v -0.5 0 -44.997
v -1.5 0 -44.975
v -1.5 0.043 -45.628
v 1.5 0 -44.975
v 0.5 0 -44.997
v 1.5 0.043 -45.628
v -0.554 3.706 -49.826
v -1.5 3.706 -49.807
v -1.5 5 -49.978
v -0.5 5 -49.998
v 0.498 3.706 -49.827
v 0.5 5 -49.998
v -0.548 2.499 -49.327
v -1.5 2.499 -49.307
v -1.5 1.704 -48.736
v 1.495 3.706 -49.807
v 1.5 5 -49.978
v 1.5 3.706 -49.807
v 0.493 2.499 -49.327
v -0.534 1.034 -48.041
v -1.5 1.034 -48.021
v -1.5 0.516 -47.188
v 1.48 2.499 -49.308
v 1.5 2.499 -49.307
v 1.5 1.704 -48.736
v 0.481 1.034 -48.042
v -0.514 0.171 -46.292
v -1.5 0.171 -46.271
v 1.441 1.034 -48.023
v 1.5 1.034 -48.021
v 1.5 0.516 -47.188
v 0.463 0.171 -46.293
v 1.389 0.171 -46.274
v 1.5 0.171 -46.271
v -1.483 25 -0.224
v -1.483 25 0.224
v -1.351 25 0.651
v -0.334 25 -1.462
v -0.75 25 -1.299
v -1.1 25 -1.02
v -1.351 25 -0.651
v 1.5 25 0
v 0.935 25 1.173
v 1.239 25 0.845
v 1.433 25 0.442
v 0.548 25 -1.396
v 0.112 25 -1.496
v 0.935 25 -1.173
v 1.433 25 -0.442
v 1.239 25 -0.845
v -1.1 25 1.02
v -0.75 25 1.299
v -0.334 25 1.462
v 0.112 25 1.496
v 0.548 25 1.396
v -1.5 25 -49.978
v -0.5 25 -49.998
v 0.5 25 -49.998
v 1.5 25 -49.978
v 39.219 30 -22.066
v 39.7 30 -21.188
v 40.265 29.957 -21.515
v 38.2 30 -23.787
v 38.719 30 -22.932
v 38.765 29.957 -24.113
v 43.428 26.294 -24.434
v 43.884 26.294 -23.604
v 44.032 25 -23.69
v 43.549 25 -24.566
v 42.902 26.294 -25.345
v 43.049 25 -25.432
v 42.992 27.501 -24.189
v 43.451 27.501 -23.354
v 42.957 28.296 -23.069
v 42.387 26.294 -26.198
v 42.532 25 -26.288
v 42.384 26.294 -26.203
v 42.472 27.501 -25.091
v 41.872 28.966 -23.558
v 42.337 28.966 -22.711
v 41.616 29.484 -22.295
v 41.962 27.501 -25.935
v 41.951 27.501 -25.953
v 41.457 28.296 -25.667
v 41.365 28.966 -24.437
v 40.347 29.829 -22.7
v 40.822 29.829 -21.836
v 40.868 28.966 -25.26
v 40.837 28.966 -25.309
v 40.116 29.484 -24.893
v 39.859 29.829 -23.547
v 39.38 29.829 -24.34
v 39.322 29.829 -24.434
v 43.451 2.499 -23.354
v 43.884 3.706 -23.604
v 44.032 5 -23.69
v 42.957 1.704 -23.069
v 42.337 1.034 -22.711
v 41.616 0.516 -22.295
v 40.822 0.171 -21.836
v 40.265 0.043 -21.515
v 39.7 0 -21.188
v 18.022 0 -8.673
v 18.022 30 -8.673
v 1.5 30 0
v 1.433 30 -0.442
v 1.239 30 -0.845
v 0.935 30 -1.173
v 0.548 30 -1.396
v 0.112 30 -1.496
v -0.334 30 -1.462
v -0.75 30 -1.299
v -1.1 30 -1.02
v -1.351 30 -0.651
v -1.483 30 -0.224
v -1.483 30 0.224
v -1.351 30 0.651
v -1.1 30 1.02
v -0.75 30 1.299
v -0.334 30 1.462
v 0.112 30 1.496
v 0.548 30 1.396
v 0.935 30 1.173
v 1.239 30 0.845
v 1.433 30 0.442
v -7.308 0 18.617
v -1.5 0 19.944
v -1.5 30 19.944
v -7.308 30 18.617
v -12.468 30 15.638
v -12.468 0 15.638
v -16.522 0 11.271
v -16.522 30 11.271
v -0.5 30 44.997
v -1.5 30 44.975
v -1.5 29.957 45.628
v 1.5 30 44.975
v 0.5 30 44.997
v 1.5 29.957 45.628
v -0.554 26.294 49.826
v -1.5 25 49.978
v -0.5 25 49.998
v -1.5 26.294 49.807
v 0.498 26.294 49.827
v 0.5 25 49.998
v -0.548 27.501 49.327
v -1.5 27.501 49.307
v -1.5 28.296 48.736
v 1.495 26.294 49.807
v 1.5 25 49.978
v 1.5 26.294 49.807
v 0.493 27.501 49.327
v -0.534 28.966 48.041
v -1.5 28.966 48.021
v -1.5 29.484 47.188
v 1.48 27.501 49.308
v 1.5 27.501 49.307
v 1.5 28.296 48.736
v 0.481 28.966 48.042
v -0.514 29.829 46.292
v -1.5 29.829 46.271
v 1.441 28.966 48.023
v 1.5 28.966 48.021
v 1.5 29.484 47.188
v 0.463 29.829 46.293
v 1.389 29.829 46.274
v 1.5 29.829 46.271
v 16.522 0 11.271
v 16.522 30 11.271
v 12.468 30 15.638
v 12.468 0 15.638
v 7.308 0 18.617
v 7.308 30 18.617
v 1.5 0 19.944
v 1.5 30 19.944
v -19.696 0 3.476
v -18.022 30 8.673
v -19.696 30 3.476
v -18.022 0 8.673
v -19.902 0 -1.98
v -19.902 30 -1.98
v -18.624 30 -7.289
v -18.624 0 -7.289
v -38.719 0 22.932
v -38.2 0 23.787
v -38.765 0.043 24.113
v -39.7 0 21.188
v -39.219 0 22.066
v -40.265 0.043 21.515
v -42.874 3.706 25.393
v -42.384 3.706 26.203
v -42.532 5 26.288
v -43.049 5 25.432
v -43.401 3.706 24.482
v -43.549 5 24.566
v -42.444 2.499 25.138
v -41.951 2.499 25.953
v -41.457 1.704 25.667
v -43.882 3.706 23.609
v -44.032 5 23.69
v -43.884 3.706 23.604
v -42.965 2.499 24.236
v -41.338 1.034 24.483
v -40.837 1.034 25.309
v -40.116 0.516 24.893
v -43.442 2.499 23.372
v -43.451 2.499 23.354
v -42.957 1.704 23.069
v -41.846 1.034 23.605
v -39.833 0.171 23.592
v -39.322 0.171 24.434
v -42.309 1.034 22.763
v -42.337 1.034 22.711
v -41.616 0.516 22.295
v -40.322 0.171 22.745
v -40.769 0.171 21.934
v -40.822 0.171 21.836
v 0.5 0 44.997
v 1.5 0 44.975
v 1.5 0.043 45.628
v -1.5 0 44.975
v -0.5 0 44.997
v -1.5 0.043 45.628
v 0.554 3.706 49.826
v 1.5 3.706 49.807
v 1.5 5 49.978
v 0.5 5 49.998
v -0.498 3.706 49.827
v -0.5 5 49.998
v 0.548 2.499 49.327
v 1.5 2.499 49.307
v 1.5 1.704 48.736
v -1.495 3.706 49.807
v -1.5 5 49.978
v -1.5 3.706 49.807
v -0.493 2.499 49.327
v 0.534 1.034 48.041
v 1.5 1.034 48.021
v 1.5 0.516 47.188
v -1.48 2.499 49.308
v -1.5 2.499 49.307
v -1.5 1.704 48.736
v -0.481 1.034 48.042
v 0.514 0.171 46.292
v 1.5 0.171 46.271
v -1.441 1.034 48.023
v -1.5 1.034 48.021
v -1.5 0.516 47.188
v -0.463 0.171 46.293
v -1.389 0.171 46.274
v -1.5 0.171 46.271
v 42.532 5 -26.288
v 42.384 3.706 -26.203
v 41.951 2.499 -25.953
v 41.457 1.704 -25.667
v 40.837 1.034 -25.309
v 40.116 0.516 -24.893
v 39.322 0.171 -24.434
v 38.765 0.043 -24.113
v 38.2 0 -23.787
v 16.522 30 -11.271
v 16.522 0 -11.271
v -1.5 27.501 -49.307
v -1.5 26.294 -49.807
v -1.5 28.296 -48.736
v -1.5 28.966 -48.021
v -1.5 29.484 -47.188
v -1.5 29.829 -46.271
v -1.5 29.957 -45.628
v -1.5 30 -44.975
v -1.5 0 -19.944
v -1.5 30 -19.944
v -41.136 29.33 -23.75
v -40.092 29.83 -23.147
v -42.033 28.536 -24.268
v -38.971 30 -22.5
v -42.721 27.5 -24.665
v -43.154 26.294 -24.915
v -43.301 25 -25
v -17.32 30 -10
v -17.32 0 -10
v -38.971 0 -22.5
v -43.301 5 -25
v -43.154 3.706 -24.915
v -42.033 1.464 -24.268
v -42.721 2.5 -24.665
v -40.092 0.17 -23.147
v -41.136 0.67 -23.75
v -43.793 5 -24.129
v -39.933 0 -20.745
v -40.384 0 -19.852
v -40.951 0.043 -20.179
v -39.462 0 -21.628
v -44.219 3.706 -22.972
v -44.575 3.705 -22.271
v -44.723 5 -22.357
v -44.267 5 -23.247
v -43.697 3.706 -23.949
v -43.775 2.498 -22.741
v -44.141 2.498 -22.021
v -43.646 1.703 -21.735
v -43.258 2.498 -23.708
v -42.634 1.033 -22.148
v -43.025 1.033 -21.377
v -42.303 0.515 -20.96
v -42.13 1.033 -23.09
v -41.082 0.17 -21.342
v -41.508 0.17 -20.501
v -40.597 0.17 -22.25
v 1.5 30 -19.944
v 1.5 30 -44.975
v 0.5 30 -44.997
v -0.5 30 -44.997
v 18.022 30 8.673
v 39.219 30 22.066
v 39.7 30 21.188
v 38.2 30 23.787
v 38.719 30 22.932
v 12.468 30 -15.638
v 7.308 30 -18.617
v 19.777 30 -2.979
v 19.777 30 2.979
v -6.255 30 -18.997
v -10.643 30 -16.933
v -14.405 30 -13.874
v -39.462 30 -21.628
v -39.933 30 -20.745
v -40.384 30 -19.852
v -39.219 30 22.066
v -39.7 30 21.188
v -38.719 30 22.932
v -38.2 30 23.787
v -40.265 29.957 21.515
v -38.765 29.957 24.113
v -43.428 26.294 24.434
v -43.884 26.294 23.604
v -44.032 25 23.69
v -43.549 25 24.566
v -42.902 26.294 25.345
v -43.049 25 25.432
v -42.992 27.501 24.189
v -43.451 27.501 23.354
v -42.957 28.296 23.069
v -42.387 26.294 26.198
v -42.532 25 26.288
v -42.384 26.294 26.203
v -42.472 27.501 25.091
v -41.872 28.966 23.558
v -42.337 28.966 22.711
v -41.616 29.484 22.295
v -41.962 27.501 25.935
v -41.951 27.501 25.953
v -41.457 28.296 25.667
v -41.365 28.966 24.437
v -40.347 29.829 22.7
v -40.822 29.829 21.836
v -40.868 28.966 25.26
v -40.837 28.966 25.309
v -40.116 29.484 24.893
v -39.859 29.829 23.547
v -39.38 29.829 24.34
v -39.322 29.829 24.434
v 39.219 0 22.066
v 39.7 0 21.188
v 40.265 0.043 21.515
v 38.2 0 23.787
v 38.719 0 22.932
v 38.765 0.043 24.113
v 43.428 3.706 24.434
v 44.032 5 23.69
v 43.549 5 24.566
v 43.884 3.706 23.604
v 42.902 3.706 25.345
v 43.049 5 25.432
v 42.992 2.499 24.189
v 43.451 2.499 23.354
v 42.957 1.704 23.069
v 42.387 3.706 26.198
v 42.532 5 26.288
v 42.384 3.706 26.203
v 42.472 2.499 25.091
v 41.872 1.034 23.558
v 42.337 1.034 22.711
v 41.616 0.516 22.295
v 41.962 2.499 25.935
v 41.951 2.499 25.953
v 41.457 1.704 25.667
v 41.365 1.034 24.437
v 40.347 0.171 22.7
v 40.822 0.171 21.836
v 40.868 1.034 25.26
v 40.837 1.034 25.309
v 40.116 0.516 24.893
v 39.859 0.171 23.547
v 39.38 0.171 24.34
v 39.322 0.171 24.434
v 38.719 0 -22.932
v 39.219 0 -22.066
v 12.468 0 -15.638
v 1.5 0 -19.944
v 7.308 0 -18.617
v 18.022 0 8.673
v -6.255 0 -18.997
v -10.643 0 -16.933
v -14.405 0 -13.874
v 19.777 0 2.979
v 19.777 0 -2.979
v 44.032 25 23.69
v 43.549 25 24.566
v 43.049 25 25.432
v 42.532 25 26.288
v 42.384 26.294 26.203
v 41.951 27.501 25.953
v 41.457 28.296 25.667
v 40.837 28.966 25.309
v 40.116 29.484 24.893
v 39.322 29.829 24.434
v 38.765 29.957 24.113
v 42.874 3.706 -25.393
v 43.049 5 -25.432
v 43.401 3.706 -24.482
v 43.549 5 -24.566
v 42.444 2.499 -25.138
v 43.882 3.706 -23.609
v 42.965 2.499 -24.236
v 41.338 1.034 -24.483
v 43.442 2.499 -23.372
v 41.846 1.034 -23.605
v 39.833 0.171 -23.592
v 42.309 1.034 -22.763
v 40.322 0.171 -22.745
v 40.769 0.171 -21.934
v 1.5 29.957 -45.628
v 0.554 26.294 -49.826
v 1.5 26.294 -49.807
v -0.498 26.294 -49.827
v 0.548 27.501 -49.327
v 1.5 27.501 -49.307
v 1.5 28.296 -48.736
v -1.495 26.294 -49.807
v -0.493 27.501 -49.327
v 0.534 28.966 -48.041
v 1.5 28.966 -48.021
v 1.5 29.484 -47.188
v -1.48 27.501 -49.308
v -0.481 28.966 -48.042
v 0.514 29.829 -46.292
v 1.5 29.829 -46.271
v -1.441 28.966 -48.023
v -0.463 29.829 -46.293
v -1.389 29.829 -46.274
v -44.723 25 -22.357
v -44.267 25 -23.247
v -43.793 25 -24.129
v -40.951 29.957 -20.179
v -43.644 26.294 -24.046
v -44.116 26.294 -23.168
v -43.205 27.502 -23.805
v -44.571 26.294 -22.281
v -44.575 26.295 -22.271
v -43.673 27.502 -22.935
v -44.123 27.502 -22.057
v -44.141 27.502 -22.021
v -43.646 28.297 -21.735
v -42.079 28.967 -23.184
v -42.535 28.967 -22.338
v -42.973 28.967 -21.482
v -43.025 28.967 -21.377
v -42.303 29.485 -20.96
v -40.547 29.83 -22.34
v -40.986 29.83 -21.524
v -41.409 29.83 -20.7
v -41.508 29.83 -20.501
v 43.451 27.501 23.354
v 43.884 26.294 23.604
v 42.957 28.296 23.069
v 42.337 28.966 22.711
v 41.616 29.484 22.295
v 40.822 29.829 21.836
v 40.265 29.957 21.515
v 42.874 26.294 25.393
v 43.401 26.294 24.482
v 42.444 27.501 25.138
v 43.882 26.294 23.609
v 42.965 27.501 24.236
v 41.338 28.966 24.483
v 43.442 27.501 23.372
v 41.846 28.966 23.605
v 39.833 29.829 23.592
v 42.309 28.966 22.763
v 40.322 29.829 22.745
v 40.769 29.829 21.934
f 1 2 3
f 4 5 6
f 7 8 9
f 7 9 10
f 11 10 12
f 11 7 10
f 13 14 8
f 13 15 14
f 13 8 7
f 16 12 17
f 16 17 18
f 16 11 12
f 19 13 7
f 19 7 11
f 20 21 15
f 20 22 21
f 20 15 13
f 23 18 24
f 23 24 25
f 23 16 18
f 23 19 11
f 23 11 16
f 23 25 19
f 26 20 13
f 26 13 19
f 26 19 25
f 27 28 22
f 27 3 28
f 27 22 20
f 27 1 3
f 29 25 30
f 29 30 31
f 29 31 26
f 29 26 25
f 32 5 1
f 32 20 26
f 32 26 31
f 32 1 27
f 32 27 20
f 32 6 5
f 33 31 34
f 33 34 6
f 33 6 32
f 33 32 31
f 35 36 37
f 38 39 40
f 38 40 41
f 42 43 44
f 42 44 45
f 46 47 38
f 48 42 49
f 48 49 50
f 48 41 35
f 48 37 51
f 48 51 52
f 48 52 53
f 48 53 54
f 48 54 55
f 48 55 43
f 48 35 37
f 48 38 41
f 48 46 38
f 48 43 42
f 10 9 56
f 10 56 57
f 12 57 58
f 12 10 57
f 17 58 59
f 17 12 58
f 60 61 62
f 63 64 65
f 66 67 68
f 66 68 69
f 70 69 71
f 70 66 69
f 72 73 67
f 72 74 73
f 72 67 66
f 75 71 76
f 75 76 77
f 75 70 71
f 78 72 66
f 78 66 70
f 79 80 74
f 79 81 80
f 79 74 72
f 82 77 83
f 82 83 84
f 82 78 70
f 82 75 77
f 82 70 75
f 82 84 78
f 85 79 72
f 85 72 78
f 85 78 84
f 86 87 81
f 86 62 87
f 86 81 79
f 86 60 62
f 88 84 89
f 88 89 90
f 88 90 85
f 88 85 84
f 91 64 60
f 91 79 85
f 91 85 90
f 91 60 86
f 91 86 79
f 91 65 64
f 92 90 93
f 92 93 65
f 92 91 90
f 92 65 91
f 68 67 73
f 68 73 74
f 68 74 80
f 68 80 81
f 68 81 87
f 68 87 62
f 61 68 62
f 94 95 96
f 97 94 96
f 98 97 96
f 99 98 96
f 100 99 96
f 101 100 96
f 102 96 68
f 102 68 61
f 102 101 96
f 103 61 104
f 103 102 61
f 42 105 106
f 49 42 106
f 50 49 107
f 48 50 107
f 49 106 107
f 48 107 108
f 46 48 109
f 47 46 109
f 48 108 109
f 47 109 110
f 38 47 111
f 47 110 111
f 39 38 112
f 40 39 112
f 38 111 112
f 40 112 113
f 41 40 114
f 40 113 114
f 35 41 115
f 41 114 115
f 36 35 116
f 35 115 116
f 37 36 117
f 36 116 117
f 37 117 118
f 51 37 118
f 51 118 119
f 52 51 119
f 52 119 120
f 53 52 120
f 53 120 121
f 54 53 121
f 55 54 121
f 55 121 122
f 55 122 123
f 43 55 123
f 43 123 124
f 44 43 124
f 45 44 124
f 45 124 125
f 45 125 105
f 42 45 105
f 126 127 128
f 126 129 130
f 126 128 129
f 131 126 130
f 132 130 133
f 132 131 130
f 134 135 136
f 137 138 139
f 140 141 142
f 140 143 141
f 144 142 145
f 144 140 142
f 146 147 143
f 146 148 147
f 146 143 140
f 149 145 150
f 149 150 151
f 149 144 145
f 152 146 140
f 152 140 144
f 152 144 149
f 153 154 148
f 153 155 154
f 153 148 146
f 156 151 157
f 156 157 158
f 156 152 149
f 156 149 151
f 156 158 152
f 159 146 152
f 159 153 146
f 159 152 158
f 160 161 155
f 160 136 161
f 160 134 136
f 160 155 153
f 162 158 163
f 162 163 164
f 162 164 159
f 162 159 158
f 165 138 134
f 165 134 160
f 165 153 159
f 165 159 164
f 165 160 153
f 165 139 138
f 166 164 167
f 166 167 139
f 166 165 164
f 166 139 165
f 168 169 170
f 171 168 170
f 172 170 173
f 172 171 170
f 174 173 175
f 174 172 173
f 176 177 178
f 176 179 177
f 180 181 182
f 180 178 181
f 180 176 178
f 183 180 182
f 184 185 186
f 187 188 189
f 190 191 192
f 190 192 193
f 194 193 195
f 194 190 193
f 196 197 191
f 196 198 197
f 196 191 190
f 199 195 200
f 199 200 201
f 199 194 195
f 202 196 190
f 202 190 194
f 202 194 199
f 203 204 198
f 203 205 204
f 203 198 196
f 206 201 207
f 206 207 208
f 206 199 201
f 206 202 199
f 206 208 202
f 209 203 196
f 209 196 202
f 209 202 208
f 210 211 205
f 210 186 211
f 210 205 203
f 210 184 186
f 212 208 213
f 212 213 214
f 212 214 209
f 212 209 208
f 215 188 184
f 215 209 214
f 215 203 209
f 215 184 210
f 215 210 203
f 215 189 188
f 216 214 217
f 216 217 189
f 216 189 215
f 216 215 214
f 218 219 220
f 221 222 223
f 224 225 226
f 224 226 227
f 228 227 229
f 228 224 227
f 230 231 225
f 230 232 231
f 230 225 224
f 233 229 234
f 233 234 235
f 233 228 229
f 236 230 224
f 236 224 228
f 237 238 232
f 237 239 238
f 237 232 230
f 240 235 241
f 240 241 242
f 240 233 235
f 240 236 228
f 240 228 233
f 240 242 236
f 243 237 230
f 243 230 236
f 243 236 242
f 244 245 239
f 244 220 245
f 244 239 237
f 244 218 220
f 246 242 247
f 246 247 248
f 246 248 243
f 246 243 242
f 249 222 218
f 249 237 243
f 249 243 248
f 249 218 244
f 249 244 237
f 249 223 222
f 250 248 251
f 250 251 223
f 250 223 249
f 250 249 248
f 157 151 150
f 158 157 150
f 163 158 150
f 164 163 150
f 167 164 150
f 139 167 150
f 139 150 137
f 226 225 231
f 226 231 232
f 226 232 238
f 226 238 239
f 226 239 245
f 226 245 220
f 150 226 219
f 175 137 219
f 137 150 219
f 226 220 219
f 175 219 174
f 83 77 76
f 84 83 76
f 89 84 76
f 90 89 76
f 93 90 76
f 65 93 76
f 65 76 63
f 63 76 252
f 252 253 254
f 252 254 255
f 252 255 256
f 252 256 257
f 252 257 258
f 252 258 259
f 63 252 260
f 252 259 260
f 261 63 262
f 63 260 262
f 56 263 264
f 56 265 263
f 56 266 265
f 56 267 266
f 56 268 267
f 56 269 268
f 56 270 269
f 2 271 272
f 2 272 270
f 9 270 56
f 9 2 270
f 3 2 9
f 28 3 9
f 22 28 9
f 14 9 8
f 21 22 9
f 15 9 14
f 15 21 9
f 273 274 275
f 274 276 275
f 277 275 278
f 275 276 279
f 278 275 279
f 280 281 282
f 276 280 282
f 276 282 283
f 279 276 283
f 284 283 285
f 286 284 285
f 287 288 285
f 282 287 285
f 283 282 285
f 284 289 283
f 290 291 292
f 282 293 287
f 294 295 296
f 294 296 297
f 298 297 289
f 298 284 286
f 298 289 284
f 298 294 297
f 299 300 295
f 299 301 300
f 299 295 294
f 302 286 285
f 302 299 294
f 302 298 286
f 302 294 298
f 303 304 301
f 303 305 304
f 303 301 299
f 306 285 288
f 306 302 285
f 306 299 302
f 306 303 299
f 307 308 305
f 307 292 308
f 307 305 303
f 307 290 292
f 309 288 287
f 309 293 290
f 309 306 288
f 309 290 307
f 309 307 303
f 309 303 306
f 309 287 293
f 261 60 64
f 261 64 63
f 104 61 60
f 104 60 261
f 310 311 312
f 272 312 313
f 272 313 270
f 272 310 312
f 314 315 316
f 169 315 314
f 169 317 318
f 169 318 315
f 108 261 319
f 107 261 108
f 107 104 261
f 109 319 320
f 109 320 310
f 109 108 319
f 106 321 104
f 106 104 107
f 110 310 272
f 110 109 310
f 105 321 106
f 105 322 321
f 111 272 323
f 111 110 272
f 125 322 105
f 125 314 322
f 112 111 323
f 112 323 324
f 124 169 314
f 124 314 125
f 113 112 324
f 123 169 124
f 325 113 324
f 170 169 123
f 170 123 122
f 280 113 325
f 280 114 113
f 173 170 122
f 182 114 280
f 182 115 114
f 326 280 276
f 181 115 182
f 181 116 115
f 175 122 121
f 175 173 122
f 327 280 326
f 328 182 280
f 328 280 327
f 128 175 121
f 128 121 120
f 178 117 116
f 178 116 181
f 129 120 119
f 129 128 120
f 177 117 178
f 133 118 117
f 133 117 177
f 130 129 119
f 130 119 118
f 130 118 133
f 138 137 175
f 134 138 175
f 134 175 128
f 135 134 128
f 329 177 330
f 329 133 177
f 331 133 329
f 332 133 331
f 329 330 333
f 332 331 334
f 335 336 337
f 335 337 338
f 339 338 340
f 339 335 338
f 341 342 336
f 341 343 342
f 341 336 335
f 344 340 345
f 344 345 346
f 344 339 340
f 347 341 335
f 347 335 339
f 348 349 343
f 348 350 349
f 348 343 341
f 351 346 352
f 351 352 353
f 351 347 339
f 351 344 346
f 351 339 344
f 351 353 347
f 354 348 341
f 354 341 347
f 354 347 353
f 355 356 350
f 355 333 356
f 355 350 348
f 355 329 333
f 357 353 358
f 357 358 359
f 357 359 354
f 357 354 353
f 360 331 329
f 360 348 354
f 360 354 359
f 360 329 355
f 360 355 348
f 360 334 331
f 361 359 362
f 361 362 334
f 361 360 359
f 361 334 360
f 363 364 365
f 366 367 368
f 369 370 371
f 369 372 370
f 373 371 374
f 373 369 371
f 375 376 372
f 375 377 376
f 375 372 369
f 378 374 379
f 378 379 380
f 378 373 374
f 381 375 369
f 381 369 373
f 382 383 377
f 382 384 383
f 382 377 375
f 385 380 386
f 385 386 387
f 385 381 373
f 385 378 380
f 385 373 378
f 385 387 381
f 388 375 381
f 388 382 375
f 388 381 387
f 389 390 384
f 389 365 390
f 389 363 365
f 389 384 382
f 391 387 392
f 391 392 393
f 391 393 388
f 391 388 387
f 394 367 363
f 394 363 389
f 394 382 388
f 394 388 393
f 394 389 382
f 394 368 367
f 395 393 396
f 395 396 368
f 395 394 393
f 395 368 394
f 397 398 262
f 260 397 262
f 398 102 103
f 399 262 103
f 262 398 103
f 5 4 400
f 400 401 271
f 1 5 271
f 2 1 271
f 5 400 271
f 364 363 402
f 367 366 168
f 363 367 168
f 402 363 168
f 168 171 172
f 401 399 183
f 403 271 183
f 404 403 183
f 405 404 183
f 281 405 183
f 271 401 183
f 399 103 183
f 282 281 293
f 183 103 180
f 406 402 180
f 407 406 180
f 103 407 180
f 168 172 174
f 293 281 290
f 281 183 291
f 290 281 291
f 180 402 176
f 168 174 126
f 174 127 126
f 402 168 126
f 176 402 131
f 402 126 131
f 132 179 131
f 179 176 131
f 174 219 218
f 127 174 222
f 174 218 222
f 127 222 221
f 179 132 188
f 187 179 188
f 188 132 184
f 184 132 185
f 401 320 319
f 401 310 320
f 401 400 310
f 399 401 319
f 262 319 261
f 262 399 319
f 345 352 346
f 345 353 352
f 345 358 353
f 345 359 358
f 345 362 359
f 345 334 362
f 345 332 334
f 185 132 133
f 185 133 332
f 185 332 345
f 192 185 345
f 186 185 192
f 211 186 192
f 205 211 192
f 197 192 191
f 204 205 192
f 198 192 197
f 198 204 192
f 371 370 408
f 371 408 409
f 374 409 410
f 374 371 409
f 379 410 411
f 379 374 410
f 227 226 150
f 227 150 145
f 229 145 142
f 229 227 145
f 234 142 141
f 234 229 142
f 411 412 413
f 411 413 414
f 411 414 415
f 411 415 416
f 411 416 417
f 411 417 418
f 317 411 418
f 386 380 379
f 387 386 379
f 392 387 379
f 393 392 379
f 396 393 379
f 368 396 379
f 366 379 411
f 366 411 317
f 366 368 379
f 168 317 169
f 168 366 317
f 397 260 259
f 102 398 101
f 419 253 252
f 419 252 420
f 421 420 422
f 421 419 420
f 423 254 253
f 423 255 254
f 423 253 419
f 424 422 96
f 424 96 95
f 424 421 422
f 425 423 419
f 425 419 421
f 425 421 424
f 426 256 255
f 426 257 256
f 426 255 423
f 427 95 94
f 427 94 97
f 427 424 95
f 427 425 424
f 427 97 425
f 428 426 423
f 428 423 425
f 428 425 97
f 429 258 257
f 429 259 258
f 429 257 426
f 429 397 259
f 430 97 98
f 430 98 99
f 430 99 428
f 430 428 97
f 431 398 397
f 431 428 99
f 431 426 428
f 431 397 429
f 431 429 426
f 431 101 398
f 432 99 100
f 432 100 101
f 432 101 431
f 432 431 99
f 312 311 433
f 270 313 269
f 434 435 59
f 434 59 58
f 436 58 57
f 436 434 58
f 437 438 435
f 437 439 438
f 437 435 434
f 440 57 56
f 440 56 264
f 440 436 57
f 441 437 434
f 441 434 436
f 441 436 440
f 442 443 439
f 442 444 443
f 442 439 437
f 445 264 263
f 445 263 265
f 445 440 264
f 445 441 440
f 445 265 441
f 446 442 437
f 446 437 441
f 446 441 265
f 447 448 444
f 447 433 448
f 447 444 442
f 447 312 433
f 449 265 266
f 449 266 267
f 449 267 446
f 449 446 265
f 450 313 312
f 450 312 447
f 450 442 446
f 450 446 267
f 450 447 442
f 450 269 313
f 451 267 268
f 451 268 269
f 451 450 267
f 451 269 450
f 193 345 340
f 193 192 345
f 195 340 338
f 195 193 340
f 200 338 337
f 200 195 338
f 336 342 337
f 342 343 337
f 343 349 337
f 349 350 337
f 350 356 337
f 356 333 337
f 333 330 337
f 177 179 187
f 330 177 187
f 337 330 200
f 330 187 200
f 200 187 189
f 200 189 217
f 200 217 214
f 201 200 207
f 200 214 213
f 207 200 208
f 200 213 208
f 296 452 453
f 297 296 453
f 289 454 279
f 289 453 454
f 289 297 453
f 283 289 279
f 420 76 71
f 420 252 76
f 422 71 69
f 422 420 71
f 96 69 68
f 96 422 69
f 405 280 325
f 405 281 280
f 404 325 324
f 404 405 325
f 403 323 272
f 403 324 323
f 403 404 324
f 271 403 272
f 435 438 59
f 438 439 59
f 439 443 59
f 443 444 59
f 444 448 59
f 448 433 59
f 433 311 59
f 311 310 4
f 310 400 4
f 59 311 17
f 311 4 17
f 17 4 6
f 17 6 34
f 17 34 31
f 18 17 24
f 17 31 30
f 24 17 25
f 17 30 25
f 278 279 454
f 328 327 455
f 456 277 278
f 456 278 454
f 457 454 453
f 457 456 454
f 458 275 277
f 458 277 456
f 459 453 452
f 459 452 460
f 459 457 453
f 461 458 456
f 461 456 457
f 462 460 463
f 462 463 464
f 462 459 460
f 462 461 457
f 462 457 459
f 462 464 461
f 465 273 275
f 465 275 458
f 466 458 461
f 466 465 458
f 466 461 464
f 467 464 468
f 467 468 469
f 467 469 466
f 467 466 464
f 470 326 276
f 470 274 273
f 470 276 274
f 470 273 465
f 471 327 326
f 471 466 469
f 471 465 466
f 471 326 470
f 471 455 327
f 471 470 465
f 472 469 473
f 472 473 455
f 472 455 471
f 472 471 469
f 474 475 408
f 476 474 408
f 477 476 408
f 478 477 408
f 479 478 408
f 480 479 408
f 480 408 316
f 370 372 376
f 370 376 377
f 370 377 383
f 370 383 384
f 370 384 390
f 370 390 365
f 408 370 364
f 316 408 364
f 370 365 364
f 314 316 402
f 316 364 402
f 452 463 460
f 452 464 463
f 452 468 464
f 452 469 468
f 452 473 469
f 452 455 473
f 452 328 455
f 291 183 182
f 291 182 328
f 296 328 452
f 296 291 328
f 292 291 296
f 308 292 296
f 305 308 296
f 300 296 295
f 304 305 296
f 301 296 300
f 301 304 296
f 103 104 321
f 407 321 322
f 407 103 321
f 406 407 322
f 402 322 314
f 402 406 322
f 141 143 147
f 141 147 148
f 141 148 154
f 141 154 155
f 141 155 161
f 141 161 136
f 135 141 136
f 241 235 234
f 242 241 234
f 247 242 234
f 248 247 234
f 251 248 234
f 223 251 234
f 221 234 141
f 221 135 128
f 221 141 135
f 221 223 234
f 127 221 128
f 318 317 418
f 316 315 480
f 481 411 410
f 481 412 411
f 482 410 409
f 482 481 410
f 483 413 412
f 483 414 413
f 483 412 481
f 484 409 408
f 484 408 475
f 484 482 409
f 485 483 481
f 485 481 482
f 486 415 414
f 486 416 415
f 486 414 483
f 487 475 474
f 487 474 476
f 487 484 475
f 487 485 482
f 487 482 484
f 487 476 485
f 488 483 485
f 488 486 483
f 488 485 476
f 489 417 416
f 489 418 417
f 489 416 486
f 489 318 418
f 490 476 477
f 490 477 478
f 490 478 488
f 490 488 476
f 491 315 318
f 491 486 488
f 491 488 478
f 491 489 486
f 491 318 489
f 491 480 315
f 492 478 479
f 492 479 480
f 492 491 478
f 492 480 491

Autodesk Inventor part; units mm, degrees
ref_plane "YZ Plane" through (0, 0, 0) normal (1, 0, 0) x (0, 1, 0)
ref_plane "XZ Plane" through (0, 0, 0) normal (0, 1, 0) x (-1, 0, 0)
ref_plane "XY Plane" through (0, 0, 0) normal (0, 0, 1) x (1, 0, 0)
sketch "Sketch1" plane through (0, 0, 0) normal (0, 1, 0) x (-1, 0, 0)
  line L0 (0, 50) -> (0, 20) construction
  line L1 (0, -20) -> (0, -50) construction
  line L2 (-43.3013, 25) -> (-17.3205, 10) construction
  line L3 (18.0217, -8.6728) -> (44.0318, -23.6897) construction
  line L4 (-43.3013, -25) -> (-17.3205, -10) construction
  line L5 (17.3205, 10) -> (43.3013, 25) construction
  line L6 (-1.5, -19.9437) -> (-1.5, -49.9775)
  line L7 (1.5, -19.9437) -> (1.5, -49.9775)
  line L8 (-44.0318, -23.6897) -> (-18.0217, -8.6728)
  line L9 (-42.5318, -26.2878) -> (-16.5217, -11.2709)
  line L10 (-44.0318, 23.6897) -> (-18.0217, 8.6728)
  line L11 (-42.5318, 26.2878) -> (-16.5217, 11.2709)
  line L12 (-1.5, 49.9775) -> (-1.5, 19.9437)
  line L13 (1.5, 49.9775) -> (1.5, 19.9437)
  line L14 (16.5217, 11.2709) -> (42.5318, 26.2878)
  line L15 (18.0217, 8.6728) -> (44.0318, 23.6897)
  line L16 (17.3205, -10) -> (43.3013, -25)
  line L17 (18.6245, -7.2888) -> (44.7233, -22.3569)
  arc A0 (-1.5, -49.9775) -> (1.5, -49.9775) centre (0, 0) ccw
  arc A1 (-44.0318, -23.6897) -> (-42.5318, -26.2878) centre (0, 0) ccw
  arc A2 (-42.5318, 26.2878) -> (-44.0318, 23.6897) centre (0, 0) ccw
  arc A3 (1.5, 49.9775) -> (-1.5, 49.9775) centre (0, 0) ccw
  arc A4 (43.3013, -25) -> (44.7233, -22.3569) centre (0, 0) ccw
  arc A5 (44.0318, 23.6897) -> (42.5318, 26.2878) centre (0, 0) ccw
  arc A6 (16.5217, 11.2709) -> (1.5, 19.9437) centre (0, 0) ccw
  arc A7 (18.6245, -7.2888) -> (18.0217, 8.6728) centre (0, 0) ccw
  arc A8 (1.5, -19.9437) -> (17.3205, -10) centre (0, 0) ccw
  arc A9 (-16.5217, -11.2709) -> (-1.5, -19.9437) centre (0, 0) ccw
  arc A10 (-1.5, 19.9437) -> (-16.5217, 11.2709) centre (0, 0) ccw
  arc A11 (-18.0217, 8.6728) -> (-18.0217, -8.6728) centre (0, 0) ccw
  dimension "d8" = 1.5
  dimension "d9" = 1.5
  dimension "d10" = 1.5
  dimension "d11" = 1.5
  dimension "d12" = 1.5
  dimension "d13" = 1.5
  dimension "d14" = 1.5
  dimension "d15" = 1.5
  dimension "d16" = 1.5
  dimension "d17" = 1.5
  dimension "d18" = 1.5
  dimension "d19" = 1.5
extrude "Extrusion1" add sketch "Sketch1" along normal blind 30
fillet "Fillet1" radius 5 12 edges at (-43.3013, 30, 25) (-43.3013, 0, 25) (-44.0321, 30, -23.6891) (-44.0321, 0, -23.6891) (0, 30, 50) (0, 0, 50) (43.3013, 0, 25) (43.3013, 30, 25) (43.3013, 30, -25) (43.3013, 0, -25) (0, 30, -50) (0, 0, -50)
sketch "Sketch2" plane through (0, 30, 0) normal (0, 1, 0) x (1, 0, 0)
  arc A0 (1.5, 44.975) -> (-1.5, 44.975) centre (0, 0) ccw construction
  line L0 (-1.5, 44.975) -> (-1.5, 19.9437) construction
  arc A1 (-1.5, 19.9437) -> (-17.3205, 10) centre (0, 0) ccw construction
  line L1 (-17.3205, 10) -> (-38.9711, 22.5) construction
  arc A2 (-38.9711, 22.5) -> (-40.3844, 19.8519) centre (0, 0) ccw construction
  line L2 (-40.3844, 19.8519) -> (-18.6245, 7.2888) construction
  arc A3 (-18.6245, 7.2888) -> (-18.0217, -8.6728) centre (0, 0) ccw construction
  line L3 (-18.0217, -8.6728) -> (-39.6995, -21.1885) construction
  arc A4 (-39.6995, -21.1885) -> (-38.1995, -23.7865) centre (0, 0) ccw construction
  line L4 (-38.1995, -23.7865) -> (-16.5217, -11.2709) construction
  arc A5 (-16.5217, -11.2709) -> (-1.5, -19.9437) centre (0, 0) ccw construction
  line L5 (-1.5, -19.9437) -> (-1.5, -44.975) construction
  arc A6 (-1.5, -44.975) -> (1.5, -44.975) centre (0, 0) ccw construction
  line L6 (1.5, -44.975) -> (1.5, -19.9437) construction
  arc A7 (1.5, -19.9437) -> (16.5217, -11.2709) centre (0, 0) ccw construction
  line L7 (16.5217, -11.2709) -> (38.1995, -23.7865) construction
  arc A8 (38.1995, -23.7865) -> (39.6995, -21.1885) centre (0, 0) ccw construction
  line L8 (39.6995, -21.1885) -> (18.0217, -8.6728) construction
  arc A9 (18.0217, -8.6728) -> (18.0217, 8.6728) centre (0, 0) ccw construction
  line L9 (18.0217, 8.6728) -> (39.6995, 21.1885) construction
  arc A10 (39.6995, 21.1885) -> (38.1995, 23.7865) centre (0, 0) ccw construction
  line L10 (38.1995, 23.7865) -> (16.5217, 11.2709) construction
  arc A11 (16.5217, 11.2709) -> (1.5, 19.9437) centre (0, 0) ccw construction
  line L11 (1.5, 19.9437) -> (1.5, 44.975) construction
  circle A12 centre (0, 0) radius 1.5
  dimension "d23" = 3
extrude "Extrusion2" cut sketch "Sketch2" against normal blind 5
equation "\"d8\" = 0.5 * blade_width"
equation "\"d9\" = 0.5 * blade_width"
equation "\"d10\" = 0.5 * blade_width"
equation "\"d11\" = 0.5 * blade_width"
equation "\"d12\" = 0.5 * blade_width"
equation "\"d13\" = 0.5 * blade_width"
equation "\"d14\" = 0.5 * blade_width"
equation "\"d15\" = 0.5 * blade_width"
equation "\"d16\" = 0.5 * blade_width"
equation "\"d17\" = 0.5 * blade_width"
equation "\"d18\" = 0.5 * blade_width"
equation "\"d19\" = 0.5 * blade_width"
equation "\"d20\" = blade_height"
equation "\"blade_width\" = 3"
equation "\"blade_height\" = 30"
properties part number "sketch_for_propeller"
